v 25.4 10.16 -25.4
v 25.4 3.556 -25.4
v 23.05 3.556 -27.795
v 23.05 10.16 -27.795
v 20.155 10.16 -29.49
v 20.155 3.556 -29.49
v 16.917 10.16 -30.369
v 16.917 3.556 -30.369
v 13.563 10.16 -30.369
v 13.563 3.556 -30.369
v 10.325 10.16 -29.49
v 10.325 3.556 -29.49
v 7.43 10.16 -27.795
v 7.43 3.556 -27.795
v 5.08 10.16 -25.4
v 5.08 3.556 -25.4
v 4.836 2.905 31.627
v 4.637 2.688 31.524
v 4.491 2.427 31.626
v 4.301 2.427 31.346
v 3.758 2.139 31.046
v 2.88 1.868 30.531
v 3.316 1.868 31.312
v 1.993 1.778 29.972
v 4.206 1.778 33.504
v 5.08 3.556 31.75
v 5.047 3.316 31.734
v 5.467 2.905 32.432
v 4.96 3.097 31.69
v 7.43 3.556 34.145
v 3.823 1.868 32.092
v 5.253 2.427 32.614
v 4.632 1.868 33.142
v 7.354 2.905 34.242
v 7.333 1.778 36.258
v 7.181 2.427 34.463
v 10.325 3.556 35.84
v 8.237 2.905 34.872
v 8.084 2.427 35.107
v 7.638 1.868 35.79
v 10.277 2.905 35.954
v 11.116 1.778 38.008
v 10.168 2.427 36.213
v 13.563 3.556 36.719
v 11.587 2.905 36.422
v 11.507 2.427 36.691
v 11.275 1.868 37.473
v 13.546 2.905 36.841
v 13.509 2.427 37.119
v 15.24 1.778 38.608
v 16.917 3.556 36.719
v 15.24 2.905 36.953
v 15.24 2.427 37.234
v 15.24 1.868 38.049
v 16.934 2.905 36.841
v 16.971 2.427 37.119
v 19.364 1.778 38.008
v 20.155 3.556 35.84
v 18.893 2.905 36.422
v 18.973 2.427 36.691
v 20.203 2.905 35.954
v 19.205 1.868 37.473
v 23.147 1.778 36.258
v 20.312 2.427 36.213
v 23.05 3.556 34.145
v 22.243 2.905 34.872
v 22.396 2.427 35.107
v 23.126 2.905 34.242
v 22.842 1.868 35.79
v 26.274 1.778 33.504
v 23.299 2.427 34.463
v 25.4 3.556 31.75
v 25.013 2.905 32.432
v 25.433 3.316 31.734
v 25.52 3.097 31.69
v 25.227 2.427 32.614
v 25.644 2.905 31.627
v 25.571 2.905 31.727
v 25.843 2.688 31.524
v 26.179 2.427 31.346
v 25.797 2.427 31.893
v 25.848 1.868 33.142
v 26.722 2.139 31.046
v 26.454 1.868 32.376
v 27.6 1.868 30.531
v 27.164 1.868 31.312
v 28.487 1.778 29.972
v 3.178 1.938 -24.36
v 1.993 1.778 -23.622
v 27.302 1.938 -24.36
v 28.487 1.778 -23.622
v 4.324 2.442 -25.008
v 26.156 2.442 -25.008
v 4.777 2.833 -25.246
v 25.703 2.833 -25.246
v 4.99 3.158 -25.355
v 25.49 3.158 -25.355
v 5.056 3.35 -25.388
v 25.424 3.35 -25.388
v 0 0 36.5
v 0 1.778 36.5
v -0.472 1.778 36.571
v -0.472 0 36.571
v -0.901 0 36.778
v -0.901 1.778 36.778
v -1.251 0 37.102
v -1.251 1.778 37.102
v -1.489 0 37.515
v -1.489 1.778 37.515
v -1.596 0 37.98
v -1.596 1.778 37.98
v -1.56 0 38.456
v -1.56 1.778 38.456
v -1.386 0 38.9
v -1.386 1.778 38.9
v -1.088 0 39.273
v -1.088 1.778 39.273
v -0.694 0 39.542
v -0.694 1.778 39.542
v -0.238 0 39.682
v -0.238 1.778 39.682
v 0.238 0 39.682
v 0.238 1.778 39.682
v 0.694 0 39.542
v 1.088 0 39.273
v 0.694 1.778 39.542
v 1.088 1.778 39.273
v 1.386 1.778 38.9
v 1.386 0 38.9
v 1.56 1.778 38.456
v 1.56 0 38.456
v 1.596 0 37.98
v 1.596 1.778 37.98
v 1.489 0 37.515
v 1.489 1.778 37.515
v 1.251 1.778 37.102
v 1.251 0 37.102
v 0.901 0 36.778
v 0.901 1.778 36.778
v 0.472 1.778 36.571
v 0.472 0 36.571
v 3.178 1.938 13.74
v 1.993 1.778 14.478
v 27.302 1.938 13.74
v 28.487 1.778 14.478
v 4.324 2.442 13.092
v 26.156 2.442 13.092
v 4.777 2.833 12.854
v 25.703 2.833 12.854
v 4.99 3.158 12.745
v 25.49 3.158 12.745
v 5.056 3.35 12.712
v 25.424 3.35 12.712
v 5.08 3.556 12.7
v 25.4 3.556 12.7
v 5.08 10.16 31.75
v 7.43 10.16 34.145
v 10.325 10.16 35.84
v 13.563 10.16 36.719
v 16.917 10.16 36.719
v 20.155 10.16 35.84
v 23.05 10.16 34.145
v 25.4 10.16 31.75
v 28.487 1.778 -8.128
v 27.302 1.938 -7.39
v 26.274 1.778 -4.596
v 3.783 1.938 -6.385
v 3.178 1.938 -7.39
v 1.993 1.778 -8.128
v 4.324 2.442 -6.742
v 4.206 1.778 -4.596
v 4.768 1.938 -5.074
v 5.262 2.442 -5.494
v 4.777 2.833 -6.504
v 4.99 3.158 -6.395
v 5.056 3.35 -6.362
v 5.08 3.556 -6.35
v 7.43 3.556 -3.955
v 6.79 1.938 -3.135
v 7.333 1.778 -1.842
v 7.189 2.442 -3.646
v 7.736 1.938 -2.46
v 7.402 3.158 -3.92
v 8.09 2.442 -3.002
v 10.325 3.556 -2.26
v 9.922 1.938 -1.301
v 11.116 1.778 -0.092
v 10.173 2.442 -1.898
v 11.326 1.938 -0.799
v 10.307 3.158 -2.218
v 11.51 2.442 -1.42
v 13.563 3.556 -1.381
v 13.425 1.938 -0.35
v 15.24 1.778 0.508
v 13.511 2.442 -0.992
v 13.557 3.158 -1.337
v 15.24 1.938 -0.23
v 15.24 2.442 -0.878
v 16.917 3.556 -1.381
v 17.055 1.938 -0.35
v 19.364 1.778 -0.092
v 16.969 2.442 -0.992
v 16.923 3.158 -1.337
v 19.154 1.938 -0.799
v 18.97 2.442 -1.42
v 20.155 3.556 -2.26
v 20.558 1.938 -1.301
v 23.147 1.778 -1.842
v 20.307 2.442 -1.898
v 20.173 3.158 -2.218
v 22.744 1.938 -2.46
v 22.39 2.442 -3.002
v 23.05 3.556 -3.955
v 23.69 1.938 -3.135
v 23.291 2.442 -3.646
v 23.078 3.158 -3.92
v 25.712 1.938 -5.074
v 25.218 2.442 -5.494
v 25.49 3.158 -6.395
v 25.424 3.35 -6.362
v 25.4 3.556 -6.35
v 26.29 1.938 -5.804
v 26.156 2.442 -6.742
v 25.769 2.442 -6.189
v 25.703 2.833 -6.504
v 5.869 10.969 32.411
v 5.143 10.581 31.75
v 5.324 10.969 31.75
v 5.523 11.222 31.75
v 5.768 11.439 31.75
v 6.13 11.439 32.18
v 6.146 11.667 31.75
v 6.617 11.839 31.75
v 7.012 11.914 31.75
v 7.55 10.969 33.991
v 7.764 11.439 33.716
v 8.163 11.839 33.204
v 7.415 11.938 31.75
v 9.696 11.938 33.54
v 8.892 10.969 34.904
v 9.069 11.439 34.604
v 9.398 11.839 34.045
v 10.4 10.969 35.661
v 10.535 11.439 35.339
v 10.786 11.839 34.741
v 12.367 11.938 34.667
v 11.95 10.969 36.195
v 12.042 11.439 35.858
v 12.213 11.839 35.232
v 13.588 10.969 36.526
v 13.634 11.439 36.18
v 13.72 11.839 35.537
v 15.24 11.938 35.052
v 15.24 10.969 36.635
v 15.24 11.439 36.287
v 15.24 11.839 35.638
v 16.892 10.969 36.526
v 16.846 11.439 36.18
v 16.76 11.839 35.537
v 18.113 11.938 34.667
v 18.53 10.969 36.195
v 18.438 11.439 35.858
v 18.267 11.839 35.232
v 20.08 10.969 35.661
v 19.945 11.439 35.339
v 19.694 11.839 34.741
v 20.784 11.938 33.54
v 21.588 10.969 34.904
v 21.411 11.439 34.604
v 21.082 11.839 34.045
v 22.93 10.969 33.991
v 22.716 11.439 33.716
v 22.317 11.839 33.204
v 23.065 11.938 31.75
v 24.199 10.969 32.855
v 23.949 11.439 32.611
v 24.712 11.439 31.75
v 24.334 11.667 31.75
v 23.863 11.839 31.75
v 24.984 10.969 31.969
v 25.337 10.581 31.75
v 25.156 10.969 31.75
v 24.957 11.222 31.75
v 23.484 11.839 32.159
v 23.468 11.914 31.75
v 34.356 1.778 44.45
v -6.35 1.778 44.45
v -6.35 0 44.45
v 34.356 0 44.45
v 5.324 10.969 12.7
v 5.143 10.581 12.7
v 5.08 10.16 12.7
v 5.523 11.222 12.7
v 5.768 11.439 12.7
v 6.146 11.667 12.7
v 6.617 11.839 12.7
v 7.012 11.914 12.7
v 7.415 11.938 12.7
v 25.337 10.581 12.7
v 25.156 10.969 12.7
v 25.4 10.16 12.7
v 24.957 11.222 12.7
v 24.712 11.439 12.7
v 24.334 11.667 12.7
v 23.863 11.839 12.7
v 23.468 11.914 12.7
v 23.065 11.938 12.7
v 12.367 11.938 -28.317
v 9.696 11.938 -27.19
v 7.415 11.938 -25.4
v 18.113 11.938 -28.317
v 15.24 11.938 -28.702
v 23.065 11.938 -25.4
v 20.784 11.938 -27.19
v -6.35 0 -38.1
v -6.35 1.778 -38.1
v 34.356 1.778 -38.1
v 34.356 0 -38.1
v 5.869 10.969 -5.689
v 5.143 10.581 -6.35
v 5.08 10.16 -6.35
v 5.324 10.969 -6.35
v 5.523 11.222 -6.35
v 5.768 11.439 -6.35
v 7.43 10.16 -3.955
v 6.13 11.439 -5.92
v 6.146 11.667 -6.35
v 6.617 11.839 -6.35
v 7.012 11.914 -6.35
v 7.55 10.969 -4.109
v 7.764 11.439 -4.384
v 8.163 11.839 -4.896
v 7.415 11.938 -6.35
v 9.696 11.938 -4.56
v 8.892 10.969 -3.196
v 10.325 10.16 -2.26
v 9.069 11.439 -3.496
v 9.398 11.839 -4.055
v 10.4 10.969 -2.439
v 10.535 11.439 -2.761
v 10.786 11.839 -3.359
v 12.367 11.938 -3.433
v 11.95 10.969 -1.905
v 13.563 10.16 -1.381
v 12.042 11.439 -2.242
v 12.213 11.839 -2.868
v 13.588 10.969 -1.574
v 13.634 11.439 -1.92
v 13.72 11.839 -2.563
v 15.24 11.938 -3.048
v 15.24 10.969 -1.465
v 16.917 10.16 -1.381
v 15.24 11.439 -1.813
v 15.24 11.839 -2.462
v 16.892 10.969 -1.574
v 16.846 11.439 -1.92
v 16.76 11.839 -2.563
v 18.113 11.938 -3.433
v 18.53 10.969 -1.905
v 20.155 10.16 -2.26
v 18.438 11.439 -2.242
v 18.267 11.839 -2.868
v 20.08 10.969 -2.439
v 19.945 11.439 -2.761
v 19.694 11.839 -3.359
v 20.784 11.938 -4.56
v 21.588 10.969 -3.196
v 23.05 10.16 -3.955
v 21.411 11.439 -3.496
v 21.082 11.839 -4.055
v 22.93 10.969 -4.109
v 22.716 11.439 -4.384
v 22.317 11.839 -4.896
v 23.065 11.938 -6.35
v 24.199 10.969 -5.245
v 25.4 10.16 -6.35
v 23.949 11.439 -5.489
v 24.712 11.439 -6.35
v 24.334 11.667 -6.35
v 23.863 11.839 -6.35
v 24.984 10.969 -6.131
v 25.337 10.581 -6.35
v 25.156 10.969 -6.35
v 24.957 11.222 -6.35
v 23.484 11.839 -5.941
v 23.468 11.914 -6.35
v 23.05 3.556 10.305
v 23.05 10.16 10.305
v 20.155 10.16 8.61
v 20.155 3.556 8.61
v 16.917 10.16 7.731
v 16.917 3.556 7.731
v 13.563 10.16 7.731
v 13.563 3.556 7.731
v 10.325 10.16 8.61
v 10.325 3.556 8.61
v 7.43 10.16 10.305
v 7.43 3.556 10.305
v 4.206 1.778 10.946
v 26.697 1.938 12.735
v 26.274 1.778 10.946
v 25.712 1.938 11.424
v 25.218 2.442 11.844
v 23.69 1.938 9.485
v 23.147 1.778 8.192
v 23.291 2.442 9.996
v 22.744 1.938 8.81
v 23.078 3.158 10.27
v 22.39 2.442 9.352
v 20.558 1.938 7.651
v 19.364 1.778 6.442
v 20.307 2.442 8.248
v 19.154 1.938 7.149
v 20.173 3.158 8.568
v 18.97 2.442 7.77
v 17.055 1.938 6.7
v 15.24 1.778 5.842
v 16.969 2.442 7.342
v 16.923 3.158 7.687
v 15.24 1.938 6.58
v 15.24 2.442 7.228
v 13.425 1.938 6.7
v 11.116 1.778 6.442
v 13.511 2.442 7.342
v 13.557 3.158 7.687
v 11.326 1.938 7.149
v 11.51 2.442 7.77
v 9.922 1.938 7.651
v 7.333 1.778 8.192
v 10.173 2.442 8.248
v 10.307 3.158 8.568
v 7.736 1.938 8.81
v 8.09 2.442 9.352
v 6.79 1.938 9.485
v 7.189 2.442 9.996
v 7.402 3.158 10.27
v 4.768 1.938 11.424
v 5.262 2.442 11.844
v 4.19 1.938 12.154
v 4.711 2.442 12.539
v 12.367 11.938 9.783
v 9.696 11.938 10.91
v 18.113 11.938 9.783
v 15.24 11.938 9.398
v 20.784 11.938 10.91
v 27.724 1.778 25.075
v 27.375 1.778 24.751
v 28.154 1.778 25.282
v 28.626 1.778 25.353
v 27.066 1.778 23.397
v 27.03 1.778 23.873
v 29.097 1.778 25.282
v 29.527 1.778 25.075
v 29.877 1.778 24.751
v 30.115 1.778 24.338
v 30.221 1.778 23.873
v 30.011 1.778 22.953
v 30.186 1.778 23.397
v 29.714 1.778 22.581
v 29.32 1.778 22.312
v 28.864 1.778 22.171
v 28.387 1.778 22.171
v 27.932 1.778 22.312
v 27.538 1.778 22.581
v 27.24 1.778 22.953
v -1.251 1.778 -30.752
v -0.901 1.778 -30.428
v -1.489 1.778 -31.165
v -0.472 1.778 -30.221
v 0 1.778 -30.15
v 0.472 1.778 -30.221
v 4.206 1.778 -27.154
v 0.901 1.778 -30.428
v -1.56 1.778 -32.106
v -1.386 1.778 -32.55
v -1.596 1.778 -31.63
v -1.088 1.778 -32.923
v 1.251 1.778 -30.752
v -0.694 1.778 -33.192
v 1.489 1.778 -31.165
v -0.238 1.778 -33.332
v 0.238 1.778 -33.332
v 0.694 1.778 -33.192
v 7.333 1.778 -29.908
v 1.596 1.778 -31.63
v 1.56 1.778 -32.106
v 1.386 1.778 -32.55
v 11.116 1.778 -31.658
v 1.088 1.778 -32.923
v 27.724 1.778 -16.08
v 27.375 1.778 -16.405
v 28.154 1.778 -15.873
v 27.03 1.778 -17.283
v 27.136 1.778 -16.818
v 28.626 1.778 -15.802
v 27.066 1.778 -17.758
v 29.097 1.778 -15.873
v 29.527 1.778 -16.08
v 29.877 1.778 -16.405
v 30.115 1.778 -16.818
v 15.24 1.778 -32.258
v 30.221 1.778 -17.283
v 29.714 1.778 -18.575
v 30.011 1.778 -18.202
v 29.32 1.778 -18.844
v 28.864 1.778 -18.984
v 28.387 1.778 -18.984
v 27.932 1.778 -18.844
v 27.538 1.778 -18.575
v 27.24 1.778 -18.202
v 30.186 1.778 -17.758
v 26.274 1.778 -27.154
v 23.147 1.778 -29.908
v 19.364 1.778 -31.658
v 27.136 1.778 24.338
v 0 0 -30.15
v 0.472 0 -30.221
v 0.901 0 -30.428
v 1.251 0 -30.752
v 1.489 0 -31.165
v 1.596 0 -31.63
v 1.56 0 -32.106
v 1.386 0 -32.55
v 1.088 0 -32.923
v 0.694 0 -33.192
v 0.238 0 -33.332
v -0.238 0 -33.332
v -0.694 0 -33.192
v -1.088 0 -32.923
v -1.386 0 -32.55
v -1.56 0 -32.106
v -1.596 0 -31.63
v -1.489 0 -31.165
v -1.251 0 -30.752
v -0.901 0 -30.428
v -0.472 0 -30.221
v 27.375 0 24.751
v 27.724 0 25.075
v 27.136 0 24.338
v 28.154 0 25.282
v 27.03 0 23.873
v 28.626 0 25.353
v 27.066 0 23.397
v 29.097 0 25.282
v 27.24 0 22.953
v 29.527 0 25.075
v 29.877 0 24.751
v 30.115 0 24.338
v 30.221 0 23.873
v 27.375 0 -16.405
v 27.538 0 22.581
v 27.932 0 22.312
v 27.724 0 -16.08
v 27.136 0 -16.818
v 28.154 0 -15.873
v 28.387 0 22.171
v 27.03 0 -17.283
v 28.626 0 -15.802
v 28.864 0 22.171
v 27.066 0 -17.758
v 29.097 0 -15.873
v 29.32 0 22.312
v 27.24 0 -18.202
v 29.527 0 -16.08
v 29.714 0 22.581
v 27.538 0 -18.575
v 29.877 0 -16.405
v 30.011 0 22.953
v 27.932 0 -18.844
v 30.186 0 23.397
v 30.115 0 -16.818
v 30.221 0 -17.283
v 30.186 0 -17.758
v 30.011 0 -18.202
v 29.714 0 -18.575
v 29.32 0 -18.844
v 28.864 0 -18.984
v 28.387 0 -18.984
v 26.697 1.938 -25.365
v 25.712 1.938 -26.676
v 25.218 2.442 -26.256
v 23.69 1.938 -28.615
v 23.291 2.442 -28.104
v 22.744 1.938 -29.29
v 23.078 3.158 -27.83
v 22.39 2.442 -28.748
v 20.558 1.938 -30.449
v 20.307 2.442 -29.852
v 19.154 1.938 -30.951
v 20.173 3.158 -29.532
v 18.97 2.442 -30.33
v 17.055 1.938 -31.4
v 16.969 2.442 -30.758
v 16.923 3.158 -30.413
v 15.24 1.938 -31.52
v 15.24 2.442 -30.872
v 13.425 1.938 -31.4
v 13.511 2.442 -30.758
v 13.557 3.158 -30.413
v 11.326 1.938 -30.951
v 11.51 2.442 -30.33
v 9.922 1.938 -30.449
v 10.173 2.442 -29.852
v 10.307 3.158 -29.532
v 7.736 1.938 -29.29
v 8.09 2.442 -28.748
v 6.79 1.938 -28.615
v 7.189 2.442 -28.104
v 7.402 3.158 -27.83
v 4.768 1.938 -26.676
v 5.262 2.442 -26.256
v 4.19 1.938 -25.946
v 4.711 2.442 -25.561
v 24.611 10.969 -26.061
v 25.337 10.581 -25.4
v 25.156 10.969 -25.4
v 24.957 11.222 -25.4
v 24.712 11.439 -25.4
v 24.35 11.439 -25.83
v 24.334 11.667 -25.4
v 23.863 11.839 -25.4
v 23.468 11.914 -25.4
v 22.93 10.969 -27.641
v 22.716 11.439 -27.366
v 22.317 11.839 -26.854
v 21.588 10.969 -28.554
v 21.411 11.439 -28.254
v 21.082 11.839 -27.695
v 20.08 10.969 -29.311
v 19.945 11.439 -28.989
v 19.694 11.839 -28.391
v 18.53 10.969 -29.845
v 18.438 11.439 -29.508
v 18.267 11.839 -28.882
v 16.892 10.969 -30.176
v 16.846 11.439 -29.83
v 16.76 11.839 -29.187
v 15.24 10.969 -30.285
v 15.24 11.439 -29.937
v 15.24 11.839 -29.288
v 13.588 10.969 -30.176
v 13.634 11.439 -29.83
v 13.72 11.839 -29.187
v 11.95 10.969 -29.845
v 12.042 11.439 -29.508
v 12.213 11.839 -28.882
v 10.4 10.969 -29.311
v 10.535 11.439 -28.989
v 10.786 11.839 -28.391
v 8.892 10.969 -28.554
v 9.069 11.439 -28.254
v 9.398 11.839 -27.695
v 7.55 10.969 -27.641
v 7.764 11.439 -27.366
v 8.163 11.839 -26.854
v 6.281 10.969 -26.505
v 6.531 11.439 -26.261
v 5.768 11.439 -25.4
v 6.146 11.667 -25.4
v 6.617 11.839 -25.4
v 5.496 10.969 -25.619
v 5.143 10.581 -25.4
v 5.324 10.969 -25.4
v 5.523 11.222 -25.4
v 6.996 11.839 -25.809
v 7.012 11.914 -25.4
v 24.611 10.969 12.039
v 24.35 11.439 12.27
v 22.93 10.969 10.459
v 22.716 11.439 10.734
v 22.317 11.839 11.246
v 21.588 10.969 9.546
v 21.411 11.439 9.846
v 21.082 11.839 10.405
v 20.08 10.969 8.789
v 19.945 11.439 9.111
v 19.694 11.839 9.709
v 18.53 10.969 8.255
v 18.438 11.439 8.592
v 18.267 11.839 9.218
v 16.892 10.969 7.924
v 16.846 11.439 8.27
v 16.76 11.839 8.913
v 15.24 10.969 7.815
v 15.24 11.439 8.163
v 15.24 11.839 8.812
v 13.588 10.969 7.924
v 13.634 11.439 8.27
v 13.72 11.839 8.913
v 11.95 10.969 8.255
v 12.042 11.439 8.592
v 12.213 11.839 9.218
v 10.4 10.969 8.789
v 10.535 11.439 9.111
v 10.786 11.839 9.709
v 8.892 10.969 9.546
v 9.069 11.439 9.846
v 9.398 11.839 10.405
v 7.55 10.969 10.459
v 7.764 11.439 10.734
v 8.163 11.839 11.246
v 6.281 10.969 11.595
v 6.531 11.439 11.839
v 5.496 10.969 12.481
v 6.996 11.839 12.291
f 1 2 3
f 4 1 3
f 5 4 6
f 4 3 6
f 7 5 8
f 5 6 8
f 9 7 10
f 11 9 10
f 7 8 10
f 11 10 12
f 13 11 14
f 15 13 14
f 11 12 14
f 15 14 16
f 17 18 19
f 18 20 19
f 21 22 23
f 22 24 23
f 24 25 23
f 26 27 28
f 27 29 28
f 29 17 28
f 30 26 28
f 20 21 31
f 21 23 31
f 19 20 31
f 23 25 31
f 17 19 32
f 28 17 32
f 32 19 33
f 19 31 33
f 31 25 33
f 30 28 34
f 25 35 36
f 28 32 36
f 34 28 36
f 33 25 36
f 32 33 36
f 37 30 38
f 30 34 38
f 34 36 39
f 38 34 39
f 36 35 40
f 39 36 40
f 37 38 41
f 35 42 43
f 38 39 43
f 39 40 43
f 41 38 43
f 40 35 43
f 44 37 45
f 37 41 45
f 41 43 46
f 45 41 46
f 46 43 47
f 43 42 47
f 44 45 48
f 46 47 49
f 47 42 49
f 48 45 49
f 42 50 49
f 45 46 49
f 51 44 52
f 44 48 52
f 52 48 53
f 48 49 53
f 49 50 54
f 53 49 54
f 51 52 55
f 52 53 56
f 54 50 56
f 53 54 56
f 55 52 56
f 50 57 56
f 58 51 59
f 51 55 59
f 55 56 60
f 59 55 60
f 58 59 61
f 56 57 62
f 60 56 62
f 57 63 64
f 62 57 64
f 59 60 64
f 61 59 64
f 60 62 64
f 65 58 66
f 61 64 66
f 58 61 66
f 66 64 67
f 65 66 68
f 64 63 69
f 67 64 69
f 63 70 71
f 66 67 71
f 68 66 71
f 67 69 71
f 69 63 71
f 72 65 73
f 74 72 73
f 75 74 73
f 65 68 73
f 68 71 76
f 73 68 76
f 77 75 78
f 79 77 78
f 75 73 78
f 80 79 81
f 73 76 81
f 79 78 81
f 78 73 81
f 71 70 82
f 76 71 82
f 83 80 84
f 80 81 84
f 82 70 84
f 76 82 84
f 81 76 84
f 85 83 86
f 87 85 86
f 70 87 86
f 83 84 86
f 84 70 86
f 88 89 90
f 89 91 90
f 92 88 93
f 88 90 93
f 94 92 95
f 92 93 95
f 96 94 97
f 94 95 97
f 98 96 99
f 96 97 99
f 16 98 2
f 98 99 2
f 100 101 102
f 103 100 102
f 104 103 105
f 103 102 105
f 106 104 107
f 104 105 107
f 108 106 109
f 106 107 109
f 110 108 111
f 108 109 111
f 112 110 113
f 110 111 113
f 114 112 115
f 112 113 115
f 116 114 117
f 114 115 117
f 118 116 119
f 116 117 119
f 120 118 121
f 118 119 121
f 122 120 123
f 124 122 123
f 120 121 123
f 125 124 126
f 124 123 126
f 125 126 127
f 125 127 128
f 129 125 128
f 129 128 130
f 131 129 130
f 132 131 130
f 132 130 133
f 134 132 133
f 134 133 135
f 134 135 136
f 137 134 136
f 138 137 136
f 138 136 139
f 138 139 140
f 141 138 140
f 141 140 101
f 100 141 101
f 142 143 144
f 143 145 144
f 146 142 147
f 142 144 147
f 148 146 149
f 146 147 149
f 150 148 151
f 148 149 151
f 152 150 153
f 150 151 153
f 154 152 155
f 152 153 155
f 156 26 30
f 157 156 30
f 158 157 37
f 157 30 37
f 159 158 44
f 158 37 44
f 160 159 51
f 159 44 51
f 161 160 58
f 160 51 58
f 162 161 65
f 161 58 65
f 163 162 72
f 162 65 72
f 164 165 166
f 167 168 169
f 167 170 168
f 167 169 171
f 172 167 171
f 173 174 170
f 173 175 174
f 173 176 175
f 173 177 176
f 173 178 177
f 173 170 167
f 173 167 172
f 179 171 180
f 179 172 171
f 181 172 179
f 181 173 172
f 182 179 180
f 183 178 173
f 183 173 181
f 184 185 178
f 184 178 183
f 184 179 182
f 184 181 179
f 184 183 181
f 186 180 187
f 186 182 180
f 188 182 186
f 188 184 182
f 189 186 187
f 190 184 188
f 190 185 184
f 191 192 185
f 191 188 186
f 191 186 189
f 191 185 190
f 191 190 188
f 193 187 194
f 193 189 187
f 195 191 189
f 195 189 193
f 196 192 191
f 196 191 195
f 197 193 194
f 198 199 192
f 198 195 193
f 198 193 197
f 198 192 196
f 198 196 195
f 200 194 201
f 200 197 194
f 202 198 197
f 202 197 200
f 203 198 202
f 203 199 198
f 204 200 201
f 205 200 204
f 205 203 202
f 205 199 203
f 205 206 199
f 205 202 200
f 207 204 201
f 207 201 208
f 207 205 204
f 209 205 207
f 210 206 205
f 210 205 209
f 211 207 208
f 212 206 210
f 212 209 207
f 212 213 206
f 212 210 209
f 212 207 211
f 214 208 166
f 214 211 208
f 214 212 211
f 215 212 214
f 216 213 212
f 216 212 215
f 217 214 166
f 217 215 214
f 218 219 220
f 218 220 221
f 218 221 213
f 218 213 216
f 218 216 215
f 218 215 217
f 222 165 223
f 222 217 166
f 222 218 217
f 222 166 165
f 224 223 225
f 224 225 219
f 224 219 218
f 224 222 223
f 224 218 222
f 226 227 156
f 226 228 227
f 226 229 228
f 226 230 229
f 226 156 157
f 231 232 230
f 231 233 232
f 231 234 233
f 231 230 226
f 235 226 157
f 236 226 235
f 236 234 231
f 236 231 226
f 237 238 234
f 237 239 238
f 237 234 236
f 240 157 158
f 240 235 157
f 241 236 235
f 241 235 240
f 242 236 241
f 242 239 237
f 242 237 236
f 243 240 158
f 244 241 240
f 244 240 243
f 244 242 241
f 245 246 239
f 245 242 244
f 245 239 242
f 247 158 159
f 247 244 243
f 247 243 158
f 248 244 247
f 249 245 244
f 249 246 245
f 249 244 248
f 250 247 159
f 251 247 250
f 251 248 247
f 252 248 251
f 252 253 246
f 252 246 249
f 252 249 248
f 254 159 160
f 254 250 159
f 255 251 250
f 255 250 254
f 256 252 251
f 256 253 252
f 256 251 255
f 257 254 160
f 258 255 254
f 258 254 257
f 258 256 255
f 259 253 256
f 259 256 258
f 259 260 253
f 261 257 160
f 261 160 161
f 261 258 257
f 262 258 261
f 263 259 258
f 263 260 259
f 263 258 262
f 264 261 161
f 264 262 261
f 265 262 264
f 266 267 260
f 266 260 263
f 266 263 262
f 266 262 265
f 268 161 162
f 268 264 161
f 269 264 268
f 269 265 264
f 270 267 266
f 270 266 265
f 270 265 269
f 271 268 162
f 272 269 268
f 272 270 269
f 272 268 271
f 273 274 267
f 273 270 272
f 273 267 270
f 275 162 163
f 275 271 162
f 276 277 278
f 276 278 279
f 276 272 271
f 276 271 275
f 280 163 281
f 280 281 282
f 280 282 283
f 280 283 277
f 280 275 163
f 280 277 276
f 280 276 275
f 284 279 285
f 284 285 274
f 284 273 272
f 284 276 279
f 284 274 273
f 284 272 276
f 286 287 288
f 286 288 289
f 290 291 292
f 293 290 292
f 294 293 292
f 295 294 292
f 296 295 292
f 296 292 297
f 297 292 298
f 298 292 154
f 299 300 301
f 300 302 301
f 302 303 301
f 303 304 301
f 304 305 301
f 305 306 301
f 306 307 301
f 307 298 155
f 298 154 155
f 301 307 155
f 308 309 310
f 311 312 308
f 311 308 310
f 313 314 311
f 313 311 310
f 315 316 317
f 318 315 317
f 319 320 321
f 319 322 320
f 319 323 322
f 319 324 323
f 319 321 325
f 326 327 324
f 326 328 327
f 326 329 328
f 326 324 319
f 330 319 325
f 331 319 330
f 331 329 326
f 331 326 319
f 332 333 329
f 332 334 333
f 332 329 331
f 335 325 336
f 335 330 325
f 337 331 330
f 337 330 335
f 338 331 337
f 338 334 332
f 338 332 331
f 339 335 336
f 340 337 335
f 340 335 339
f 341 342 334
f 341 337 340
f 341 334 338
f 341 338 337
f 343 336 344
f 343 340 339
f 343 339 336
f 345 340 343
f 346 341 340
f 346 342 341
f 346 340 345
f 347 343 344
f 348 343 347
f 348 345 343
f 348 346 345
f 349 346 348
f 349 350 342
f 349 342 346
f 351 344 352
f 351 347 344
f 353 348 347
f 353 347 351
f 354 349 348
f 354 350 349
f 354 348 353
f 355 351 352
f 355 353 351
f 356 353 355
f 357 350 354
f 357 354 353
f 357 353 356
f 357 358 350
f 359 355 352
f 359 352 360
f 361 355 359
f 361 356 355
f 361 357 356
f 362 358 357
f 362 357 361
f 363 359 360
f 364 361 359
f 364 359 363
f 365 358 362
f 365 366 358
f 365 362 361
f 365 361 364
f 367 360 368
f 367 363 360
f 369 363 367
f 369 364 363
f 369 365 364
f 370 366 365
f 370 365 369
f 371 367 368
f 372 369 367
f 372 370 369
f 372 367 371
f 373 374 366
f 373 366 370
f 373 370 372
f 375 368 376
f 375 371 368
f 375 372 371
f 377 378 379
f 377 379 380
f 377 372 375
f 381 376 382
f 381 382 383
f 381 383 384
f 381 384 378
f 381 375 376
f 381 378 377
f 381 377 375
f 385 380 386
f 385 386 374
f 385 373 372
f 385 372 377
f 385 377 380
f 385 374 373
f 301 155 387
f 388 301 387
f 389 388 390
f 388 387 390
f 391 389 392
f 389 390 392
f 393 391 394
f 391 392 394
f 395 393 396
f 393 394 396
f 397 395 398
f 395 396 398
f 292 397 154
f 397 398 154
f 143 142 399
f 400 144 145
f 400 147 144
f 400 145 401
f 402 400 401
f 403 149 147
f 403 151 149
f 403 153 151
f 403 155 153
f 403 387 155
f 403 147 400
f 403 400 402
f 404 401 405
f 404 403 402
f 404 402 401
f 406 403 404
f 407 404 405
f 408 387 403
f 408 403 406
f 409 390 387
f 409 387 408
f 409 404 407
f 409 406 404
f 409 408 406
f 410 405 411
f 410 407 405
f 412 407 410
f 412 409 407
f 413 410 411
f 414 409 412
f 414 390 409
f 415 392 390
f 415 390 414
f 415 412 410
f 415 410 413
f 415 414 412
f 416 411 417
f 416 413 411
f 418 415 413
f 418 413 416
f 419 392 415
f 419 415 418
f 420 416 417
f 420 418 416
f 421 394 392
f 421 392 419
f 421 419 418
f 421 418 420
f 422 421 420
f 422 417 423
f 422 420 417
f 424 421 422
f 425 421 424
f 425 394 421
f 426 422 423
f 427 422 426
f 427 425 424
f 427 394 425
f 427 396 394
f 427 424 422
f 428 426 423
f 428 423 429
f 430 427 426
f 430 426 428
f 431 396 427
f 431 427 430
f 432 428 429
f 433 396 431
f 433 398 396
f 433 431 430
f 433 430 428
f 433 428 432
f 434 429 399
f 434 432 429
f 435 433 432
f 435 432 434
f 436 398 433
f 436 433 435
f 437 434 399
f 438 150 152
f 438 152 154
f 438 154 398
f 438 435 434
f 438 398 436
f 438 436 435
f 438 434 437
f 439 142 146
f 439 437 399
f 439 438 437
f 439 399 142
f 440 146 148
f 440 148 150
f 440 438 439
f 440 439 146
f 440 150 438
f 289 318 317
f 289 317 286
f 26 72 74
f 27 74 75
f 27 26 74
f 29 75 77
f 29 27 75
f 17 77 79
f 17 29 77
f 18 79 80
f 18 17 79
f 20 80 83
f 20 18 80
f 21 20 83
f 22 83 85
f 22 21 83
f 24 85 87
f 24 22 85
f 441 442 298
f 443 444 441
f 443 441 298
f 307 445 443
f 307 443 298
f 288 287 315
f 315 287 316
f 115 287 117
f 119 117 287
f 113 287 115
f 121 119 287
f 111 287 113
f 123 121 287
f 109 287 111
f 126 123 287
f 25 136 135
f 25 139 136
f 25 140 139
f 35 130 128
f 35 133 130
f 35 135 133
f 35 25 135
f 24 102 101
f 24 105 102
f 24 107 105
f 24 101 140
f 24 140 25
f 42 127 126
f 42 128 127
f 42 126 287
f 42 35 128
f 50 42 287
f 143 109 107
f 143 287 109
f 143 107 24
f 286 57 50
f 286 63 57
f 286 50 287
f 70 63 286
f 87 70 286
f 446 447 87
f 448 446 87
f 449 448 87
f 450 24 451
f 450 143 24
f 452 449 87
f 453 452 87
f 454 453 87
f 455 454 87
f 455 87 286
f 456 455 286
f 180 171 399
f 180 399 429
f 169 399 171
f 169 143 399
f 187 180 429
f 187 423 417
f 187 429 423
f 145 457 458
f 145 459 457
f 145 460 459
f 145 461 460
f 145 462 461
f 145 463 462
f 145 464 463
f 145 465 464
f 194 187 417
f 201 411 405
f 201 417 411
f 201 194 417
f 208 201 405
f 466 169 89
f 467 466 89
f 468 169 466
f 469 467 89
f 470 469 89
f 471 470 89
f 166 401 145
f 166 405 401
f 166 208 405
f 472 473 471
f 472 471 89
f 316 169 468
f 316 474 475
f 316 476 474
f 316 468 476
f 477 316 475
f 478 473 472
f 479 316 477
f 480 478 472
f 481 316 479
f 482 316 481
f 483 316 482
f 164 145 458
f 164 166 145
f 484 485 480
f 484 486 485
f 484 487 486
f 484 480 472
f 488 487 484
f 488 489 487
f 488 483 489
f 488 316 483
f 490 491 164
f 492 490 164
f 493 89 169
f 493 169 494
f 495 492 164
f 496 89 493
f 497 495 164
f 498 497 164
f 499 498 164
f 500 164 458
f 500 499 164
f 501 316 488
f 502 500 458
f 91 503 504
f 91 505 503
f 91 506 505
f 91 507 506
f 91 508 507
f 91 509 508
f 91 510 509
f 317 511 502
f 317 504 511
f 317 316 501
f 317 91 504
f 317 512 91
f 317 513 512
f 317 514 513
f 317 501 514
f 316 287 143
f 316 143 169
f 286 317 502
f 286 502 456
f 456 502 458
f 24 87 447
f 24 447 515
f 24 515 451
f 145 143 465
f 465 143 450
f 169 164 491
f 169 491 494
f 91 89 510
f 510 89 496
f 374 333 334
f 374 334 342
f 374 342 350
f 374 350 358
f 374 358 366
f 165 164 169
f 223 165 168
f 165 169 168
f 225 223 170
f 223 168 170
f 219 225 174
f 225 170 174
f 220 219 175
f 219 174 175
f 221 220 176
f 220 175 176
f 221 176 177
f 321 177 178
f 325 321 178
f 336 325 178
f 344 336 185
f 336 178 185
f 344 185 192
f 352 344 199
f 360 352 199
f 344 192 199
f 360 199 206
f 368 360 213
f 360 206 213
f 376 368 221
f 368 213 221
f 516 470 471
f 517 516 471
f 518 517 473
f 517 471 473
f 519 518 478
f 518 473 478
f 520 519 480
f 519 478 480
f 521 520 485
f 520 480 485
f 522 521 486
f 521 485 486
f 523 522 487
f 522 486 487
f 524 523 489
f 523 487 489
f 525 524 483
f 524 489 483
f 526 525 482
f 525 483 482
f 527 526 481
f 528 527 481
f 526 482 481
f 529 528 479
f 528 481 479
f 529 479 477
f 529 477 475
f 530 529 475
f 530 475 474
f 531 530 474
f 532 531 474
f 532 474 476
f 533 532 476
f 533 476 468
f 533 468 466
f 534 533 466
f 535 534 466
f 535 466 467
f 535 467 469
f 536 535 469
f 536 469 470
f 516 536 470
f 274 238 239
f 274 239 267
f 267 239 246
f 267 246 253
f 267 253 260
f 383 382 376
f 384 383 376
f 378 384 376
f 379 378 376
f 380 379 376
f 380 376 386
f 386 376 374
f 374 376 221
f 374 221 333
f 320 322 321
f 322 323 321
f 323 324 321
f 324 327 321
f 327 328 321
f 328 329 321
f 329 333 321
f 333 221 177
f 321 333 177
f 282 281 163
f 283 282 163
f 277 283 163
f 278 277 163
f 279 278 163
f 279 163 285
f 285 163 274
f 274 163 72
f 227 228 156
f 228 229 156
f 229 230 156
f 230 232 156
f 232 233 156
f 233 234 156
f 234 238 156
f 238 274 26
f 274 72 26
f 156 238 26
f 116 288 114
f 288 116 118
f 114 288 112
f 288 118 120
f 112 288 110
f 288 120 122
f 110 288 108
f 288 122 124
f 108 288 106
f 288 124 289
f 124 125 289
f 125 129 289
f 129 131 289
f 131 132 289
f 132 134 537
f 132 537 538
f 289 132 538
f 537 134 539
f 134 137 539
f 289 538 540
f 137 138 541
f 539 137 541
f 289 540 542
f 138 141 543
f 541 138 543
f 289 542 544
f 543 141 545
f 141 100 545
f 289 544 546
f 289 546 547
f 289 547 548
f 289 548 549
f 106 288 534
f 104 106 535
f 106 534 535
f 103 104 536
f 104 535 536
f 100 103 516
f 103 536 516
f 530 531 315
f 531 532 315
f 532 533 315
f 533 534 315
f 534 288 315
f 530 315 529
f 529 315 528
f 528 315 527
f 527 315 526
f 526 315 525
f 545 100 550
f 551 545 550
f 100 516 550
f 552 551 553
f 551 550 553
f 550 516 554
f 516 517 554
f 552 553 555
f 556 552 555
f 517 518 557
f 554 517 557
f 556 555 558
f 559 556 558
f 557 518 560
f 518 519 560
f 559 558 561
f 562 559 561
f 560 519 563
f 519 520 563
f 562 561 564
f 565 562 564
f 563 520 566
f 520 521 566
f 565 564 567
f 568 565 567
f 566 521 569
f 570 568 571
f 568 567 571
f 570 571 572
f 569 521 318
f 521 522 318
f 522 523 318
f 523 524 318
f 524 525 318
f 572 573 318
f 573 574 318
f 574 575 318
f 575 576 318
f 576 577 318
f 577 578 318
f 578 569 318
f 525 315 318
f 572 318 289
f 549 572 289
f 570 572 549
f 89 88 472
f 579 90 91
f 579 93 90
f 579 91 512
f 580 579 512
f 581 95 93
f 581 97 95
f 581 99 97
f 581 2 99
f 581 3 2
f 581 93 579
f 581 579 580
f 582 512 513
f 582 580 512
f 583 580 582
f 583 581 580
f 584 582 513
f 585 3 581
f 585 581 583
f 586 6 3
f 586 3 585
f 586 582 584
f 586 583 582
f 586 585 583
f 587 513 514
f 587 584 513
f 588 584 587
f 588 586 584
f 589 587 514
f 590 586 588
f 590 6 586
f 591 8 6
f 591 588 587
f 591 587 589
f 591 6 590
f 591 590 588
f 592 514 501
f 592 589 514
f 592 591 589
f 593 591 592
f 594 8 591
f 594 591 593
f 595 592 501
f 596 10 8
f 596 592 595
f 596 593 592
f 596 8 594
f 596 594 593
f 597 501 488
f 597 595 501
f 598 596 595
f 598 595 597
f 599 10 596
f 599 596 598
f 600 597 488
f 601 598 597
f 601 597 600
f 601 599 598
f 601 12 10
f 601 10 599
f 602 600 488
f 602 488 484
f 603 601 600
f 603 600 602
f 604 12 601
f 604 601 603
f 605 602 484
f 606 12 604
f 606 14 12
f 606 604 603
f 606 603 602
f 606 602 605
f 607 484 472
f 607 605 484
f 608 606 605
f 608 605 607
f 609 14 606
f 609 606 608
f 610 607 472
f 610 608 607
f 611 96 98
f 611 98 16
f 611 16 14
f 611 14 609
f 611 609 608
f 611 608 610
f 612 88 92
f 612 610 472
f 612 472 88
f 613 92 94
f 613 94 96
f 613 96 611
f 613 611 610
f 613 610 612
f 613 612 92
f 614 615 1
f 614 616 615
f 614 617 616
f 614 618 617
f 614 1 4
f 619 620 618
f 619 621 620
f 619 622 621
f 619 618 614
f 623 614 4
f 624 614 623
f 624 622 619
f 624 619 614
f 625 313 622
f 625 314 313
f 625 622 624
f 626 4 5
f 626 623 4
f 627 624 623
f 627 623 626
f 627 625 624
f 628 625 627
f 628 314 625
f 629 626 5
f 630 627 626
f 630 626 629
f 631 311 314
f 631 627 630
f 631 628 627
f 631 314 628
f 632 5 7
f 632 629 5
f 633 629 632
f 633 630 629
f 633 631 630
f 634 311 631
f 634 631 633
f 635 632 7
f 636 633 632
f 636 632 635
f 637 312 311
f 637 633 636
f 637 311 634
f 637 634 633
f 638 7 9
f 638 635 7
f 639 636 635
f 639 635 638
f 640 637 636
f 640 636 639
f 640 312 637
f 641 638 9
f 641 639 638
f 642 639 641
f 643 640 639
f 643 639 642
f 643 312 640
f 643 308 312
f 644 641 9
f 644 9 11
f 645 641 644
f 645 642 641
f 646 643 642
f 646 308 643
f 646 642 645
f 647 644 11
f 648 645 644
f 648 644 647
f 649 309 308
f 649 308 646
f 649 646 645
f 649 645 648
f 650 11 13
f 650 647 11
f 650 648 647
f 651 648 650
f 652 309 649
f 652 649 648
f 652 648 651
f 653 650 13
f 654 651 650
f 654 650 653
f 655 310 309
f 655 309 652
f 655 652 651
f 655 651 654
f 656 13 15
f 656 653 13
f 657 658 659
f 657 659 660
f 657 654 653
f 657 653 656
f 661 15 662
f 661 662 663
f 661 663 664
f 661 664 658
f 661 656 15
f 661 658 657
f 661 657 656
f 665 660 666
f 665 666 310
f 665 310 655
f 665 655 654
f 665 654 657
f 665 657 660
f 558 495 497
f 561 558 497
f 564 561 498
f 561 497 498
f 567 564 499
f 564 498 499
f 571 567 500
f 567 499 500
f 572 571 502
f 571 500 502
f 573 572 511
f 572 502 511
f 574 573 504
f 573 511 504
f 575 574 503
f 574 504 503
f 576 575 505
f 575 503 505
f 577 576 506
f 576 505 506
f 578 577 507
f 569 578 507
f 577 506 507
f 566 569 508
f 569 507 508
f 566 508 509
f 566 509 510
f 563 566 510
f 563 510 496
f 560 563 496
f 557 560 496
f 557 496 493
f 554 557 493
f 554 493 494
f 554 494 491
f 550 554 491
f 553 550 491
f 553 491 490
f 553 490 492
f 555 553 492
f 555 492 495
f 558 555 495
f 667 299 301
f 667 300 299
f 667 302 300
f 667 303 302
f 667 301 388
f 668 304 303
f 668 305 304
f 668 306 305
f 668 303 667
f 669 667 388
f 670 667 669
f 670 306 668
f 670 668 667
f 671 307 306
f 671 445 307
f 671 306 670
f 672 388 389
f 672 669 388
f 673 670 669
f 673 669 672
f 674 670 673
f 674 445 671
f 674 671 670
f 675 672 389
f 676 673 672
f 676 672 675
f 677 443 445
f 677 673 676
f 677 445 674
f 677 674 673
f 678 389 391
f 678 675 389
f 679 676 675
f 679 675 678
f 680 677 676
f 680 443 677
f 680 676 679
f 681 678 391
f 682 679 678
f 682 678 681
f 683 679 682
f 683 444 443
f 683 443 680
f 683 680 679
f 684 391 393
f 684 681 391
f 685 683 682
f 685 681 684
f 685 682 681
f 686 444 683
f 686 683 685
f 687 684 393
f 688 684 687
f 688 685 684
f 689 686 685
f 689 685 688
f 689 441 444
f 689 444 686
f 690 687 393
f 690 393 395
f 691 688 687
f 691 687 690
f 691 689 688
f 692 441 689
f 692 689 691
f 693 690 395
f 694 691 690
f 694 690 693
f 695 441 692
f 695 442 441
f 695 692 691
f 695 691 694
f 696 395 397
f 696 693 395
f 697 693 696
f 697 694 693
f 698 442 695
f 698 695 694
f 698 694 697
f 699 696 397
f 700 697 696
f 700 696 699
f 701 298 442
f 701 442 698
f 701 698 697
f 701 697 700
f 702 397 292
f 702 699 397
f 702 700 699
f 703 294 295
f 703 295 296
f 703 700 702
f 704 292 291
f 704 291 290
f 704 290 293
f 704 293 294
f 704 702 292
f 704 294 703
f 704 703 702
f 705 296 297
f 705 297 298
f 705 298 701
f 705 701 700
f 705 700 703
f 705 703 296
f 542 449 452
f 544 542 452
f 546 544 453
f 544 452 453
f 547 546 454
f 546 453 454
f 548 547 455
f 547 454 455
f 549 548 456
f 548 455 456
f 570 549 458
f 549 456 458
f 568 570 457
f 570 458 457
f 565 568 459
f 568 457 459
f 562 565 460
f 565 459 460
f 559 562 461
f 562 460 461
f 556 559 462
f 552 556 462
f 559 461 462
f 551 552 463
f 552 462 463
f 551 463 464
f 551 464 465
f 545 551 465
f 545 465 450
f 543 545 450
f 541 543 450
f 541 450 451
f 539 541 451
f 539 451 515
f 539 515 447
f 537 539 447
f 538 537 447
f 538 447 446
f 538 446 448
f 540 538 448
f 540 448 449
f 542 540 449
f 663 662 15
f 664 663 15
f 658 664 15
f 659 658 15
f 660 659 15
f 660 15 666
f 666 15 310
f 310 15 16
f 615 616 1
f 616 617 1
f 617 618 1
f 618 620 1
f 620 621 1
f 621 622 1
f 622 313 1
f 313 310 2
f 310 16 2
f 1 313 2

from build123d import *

# Parameters (mm, degrees)
SKETCH1_W            = 30.48
SKETCH1_H            = 31.75
BOSS_EXTRUDE1_DEPTH  = 1.778
BOSS_EXTRUDE2_DEPTH  = 10.16
SKETCH4_W            = 127
SKETCH4_H            = 82.55
SKETCH4_W_2          = 30.48
SKETCH4_H_2          = 31.75
BOSS_EXTRUDE3_DEPTH  = 1.778
LPATTERN1_COUNT      = 2
LPATTERN1_PITCH      = 83.82
LPATTERN1_COUNT_DIR2 = 2
LPATTERN1_PITCH_DIR2 = 38.1
BOSS_EXTRUDE4_DEPTH  = 10.16
FILLET2_R            = 1.778
FILLET3_R            = 1.778
SKETCH6_R            = 1.6
CUT_EXTRUDE1_DEPTH   = 129.978488912
SKETCH7_R            = 1.6
CUT_EXTRUDE2_DEPTH   = 129.978488912
SKETCH8_W            = 86.294069194
SKETCH8_H            = 82.55
CUT_EXTRUDE3_DEPTH   = 130.130712251


with BuildPart() as part:
    # Sketch1 → Boss-Extrude1 (new body)
    with BuildSketch(Plane(origin=(0, 0, 0), x_dir=(1, 0, 0), z_dir=(0, 1, 0))):
        with Locations((15.24, 15.875)):
            Rectangle(SKETCH1_W, SKETCH1_H)
    extrude(amount=BOSS_EXTRUDE1_DEPTH)

    # Sketch2 → Boss-Extrude2 (add)
    with BuildSketch(Plane(origin=(0, 1.778, 0), x_dir=(1, 0, 0), z_dir=(0, 1, 0))):
        with BuildLine():
            ThreePointArc((25.4, 25.4), (15.24, 30.48), (5.08, 25.4))
            Line((5.08, 25.4), (25.4, 25.4))
        make_face()
        with BuildLine():
            Line((25.4, 6.35), (5.08, 6.35))
            ThreePointArc((5.08, 6.35), (15.24, 1.27), (25.4, 6.35))
        make_face()
    boss_extrude2 = extrude(amount=BOSS_EXTRUDE2_DEPTH)

    # Sketch4 → Boss-Extrude3 (add)
    with BuildSketch(Plane(origin=(0, 1.778, 0), x_dir=(1, 0, 0), z_dir=(0, 1, 0))):
        with Locations((57.15, -3.175)):
            Rectangle(SKETCH4_W, SKETCH4_H)
        with Locations((15.24, 15.875)):
            Rectangle(SKETCH4_W_2, SKETCH4_H_2, mode=Mode.SUBTRACT)
    extrude(amount=-BOSS_EXTRUDE3_DEPTH)

    # LPattern1: Boss-Extrude2 2 × 2
    with Locations(*[(i * LPATTERN1_PITCH, 0, j * LPATTERN1_PITCH_DIR2) for i in range(LPATTERN1_COUNT) for j in range(LPATTERN1_COUNT_DIR2) if (i, j) != (0, 0)]):
        add(boss_extrude2)

    # Sketch5 → Boss-Extrude4 (add)
    with BuildSketch(Plane(origin=(0, 1.778, 0), x_dir=(1, 0, 0), z_dir=(0, 1, 0))):
        with BuildLine():
            ThreePointArc((47.625, -12.7), (42.545, -22.86), (47.625, -33.02))
            Line((47.625, -33.02), (47.625, -12.7))
        make_face()
        with BuildLine():
            Line((66.675, -12.7), (66.675, -33.02))
            ThreePointArc((66.675, -33.02), (71.755, -22.86), (66.675, -12.7))
        make_face()
    extrude(amount=BOSS_EXTRUDE4_DEPTH)

    # Fillet2
    fillet2_edges = [part.edges().sort_by_distance(p)[0] for p in [
        (15.24, 11.938, -1.27),
        (15.24, 11.938, -30.48),
        (99.06, 11.938, -30.48),
        (99.06, 11.938, -1.27),
        (99.06, 11.938, 7.62),
        (99.06, 11.938, 36.83),
        (42.545, 11.938, 22.86),
        (71.755, 11.938, 22.86),
        (15.24, 11.938, 36.83),
        (15.24, 11.938, 7.62),
    ]]
    fillet(fillet2_edges, radius=FILLET2_R)

    # Fillet3
    fillet3_edges = [part.edges().sort_by_distance(p)[0] for p in [
        (99.06, 1.778, -30.48),
        (99.06, 1.778, -6.35),
        (99.06, 1.778, 7.62),
        (99.06, 1.778, 31.75),
        (99.06, 1.778, -25.4),
        (99.06, 1.778, -1.27),
        (99.06, 1.778, 12.7),
        (99.06, 1.778, 36.83),
        (47.625, 1.778, 22.86),
        (71.755, 1.778, 22.86),
        (15.24, 1.778, 31.75),
        (15.24, 1.778, 36.83),
        (66.675, 1.778, 22.86),
        (42.545, 1.778, 22.86),
        (15.24, 1.778, -6.35),
        (15.24, 1.778, 7.62),
        (15.24, 1.778, 12.7),
        (15.24, 1.778, -1.27),
        (15.24, 1.778, -30.48),
        (15.24, 1.778, -25.4),
    ]]
    fillet(fillet3_edges, radius=FILLET3_R)

    # Sketch6 → Cut-Extrude1 (cut, through all)
    with BuildSketch(Plane(origin=(0, 1.778, 0), x_dir=(1, 0, 0), z_dir=(0, 1, 0))):
        with Locations((85.6742, 17.402175)):
            Circle(SKETCH6_R)
        with Locations((28.6258, 17.402175)):
            Circle(SKETCH6_R)
        with Locations((28.6258, -23.753445)):
            Circle(SKETCH6_R)
        with Locations((85.6742, -23.753445)):
            Circle(SKETCH6_R)
    extrude(amount=-CUT_EXTRUDE1_DEPTH, mode=Mode.SUBTRACT)

    # Sketch7 → Cut-Extrude2 (cut, through all)
    with BuildSketch(Plane(origin=(0, 1.778, 0), x_dir=(1, 0, 0), z_dir=(0, 1, 0))):
        with Locations((0, 31.75)):
            Circle(SKETCH7_R)
        with Locations((114.3, 31.75)):
            Circle(SKETCH7_R)
        with Locations((114.3, -38.1)):
            Circle(SKETCH7_R)
        with Locations((0, -38.1)):
            Circle(SKETCH7_R)
    extrude(amount=-CUT_EXTRUDE2_DEPTH, mode=Mode.SUBTRACT)

    # Sketch8 → Cut-Extrude3 (cut, through all)
    with BuildSketch(Plane.XZ):
        with Locations((77.502965403, 3.175)):
            Rectangle(SKETCH8_W, SKETCH8_H)
    extrude(amount=-CUT_EXTRUDE3_DEPTH, mode=Mode.SUBTRACT)


solid = part.part
